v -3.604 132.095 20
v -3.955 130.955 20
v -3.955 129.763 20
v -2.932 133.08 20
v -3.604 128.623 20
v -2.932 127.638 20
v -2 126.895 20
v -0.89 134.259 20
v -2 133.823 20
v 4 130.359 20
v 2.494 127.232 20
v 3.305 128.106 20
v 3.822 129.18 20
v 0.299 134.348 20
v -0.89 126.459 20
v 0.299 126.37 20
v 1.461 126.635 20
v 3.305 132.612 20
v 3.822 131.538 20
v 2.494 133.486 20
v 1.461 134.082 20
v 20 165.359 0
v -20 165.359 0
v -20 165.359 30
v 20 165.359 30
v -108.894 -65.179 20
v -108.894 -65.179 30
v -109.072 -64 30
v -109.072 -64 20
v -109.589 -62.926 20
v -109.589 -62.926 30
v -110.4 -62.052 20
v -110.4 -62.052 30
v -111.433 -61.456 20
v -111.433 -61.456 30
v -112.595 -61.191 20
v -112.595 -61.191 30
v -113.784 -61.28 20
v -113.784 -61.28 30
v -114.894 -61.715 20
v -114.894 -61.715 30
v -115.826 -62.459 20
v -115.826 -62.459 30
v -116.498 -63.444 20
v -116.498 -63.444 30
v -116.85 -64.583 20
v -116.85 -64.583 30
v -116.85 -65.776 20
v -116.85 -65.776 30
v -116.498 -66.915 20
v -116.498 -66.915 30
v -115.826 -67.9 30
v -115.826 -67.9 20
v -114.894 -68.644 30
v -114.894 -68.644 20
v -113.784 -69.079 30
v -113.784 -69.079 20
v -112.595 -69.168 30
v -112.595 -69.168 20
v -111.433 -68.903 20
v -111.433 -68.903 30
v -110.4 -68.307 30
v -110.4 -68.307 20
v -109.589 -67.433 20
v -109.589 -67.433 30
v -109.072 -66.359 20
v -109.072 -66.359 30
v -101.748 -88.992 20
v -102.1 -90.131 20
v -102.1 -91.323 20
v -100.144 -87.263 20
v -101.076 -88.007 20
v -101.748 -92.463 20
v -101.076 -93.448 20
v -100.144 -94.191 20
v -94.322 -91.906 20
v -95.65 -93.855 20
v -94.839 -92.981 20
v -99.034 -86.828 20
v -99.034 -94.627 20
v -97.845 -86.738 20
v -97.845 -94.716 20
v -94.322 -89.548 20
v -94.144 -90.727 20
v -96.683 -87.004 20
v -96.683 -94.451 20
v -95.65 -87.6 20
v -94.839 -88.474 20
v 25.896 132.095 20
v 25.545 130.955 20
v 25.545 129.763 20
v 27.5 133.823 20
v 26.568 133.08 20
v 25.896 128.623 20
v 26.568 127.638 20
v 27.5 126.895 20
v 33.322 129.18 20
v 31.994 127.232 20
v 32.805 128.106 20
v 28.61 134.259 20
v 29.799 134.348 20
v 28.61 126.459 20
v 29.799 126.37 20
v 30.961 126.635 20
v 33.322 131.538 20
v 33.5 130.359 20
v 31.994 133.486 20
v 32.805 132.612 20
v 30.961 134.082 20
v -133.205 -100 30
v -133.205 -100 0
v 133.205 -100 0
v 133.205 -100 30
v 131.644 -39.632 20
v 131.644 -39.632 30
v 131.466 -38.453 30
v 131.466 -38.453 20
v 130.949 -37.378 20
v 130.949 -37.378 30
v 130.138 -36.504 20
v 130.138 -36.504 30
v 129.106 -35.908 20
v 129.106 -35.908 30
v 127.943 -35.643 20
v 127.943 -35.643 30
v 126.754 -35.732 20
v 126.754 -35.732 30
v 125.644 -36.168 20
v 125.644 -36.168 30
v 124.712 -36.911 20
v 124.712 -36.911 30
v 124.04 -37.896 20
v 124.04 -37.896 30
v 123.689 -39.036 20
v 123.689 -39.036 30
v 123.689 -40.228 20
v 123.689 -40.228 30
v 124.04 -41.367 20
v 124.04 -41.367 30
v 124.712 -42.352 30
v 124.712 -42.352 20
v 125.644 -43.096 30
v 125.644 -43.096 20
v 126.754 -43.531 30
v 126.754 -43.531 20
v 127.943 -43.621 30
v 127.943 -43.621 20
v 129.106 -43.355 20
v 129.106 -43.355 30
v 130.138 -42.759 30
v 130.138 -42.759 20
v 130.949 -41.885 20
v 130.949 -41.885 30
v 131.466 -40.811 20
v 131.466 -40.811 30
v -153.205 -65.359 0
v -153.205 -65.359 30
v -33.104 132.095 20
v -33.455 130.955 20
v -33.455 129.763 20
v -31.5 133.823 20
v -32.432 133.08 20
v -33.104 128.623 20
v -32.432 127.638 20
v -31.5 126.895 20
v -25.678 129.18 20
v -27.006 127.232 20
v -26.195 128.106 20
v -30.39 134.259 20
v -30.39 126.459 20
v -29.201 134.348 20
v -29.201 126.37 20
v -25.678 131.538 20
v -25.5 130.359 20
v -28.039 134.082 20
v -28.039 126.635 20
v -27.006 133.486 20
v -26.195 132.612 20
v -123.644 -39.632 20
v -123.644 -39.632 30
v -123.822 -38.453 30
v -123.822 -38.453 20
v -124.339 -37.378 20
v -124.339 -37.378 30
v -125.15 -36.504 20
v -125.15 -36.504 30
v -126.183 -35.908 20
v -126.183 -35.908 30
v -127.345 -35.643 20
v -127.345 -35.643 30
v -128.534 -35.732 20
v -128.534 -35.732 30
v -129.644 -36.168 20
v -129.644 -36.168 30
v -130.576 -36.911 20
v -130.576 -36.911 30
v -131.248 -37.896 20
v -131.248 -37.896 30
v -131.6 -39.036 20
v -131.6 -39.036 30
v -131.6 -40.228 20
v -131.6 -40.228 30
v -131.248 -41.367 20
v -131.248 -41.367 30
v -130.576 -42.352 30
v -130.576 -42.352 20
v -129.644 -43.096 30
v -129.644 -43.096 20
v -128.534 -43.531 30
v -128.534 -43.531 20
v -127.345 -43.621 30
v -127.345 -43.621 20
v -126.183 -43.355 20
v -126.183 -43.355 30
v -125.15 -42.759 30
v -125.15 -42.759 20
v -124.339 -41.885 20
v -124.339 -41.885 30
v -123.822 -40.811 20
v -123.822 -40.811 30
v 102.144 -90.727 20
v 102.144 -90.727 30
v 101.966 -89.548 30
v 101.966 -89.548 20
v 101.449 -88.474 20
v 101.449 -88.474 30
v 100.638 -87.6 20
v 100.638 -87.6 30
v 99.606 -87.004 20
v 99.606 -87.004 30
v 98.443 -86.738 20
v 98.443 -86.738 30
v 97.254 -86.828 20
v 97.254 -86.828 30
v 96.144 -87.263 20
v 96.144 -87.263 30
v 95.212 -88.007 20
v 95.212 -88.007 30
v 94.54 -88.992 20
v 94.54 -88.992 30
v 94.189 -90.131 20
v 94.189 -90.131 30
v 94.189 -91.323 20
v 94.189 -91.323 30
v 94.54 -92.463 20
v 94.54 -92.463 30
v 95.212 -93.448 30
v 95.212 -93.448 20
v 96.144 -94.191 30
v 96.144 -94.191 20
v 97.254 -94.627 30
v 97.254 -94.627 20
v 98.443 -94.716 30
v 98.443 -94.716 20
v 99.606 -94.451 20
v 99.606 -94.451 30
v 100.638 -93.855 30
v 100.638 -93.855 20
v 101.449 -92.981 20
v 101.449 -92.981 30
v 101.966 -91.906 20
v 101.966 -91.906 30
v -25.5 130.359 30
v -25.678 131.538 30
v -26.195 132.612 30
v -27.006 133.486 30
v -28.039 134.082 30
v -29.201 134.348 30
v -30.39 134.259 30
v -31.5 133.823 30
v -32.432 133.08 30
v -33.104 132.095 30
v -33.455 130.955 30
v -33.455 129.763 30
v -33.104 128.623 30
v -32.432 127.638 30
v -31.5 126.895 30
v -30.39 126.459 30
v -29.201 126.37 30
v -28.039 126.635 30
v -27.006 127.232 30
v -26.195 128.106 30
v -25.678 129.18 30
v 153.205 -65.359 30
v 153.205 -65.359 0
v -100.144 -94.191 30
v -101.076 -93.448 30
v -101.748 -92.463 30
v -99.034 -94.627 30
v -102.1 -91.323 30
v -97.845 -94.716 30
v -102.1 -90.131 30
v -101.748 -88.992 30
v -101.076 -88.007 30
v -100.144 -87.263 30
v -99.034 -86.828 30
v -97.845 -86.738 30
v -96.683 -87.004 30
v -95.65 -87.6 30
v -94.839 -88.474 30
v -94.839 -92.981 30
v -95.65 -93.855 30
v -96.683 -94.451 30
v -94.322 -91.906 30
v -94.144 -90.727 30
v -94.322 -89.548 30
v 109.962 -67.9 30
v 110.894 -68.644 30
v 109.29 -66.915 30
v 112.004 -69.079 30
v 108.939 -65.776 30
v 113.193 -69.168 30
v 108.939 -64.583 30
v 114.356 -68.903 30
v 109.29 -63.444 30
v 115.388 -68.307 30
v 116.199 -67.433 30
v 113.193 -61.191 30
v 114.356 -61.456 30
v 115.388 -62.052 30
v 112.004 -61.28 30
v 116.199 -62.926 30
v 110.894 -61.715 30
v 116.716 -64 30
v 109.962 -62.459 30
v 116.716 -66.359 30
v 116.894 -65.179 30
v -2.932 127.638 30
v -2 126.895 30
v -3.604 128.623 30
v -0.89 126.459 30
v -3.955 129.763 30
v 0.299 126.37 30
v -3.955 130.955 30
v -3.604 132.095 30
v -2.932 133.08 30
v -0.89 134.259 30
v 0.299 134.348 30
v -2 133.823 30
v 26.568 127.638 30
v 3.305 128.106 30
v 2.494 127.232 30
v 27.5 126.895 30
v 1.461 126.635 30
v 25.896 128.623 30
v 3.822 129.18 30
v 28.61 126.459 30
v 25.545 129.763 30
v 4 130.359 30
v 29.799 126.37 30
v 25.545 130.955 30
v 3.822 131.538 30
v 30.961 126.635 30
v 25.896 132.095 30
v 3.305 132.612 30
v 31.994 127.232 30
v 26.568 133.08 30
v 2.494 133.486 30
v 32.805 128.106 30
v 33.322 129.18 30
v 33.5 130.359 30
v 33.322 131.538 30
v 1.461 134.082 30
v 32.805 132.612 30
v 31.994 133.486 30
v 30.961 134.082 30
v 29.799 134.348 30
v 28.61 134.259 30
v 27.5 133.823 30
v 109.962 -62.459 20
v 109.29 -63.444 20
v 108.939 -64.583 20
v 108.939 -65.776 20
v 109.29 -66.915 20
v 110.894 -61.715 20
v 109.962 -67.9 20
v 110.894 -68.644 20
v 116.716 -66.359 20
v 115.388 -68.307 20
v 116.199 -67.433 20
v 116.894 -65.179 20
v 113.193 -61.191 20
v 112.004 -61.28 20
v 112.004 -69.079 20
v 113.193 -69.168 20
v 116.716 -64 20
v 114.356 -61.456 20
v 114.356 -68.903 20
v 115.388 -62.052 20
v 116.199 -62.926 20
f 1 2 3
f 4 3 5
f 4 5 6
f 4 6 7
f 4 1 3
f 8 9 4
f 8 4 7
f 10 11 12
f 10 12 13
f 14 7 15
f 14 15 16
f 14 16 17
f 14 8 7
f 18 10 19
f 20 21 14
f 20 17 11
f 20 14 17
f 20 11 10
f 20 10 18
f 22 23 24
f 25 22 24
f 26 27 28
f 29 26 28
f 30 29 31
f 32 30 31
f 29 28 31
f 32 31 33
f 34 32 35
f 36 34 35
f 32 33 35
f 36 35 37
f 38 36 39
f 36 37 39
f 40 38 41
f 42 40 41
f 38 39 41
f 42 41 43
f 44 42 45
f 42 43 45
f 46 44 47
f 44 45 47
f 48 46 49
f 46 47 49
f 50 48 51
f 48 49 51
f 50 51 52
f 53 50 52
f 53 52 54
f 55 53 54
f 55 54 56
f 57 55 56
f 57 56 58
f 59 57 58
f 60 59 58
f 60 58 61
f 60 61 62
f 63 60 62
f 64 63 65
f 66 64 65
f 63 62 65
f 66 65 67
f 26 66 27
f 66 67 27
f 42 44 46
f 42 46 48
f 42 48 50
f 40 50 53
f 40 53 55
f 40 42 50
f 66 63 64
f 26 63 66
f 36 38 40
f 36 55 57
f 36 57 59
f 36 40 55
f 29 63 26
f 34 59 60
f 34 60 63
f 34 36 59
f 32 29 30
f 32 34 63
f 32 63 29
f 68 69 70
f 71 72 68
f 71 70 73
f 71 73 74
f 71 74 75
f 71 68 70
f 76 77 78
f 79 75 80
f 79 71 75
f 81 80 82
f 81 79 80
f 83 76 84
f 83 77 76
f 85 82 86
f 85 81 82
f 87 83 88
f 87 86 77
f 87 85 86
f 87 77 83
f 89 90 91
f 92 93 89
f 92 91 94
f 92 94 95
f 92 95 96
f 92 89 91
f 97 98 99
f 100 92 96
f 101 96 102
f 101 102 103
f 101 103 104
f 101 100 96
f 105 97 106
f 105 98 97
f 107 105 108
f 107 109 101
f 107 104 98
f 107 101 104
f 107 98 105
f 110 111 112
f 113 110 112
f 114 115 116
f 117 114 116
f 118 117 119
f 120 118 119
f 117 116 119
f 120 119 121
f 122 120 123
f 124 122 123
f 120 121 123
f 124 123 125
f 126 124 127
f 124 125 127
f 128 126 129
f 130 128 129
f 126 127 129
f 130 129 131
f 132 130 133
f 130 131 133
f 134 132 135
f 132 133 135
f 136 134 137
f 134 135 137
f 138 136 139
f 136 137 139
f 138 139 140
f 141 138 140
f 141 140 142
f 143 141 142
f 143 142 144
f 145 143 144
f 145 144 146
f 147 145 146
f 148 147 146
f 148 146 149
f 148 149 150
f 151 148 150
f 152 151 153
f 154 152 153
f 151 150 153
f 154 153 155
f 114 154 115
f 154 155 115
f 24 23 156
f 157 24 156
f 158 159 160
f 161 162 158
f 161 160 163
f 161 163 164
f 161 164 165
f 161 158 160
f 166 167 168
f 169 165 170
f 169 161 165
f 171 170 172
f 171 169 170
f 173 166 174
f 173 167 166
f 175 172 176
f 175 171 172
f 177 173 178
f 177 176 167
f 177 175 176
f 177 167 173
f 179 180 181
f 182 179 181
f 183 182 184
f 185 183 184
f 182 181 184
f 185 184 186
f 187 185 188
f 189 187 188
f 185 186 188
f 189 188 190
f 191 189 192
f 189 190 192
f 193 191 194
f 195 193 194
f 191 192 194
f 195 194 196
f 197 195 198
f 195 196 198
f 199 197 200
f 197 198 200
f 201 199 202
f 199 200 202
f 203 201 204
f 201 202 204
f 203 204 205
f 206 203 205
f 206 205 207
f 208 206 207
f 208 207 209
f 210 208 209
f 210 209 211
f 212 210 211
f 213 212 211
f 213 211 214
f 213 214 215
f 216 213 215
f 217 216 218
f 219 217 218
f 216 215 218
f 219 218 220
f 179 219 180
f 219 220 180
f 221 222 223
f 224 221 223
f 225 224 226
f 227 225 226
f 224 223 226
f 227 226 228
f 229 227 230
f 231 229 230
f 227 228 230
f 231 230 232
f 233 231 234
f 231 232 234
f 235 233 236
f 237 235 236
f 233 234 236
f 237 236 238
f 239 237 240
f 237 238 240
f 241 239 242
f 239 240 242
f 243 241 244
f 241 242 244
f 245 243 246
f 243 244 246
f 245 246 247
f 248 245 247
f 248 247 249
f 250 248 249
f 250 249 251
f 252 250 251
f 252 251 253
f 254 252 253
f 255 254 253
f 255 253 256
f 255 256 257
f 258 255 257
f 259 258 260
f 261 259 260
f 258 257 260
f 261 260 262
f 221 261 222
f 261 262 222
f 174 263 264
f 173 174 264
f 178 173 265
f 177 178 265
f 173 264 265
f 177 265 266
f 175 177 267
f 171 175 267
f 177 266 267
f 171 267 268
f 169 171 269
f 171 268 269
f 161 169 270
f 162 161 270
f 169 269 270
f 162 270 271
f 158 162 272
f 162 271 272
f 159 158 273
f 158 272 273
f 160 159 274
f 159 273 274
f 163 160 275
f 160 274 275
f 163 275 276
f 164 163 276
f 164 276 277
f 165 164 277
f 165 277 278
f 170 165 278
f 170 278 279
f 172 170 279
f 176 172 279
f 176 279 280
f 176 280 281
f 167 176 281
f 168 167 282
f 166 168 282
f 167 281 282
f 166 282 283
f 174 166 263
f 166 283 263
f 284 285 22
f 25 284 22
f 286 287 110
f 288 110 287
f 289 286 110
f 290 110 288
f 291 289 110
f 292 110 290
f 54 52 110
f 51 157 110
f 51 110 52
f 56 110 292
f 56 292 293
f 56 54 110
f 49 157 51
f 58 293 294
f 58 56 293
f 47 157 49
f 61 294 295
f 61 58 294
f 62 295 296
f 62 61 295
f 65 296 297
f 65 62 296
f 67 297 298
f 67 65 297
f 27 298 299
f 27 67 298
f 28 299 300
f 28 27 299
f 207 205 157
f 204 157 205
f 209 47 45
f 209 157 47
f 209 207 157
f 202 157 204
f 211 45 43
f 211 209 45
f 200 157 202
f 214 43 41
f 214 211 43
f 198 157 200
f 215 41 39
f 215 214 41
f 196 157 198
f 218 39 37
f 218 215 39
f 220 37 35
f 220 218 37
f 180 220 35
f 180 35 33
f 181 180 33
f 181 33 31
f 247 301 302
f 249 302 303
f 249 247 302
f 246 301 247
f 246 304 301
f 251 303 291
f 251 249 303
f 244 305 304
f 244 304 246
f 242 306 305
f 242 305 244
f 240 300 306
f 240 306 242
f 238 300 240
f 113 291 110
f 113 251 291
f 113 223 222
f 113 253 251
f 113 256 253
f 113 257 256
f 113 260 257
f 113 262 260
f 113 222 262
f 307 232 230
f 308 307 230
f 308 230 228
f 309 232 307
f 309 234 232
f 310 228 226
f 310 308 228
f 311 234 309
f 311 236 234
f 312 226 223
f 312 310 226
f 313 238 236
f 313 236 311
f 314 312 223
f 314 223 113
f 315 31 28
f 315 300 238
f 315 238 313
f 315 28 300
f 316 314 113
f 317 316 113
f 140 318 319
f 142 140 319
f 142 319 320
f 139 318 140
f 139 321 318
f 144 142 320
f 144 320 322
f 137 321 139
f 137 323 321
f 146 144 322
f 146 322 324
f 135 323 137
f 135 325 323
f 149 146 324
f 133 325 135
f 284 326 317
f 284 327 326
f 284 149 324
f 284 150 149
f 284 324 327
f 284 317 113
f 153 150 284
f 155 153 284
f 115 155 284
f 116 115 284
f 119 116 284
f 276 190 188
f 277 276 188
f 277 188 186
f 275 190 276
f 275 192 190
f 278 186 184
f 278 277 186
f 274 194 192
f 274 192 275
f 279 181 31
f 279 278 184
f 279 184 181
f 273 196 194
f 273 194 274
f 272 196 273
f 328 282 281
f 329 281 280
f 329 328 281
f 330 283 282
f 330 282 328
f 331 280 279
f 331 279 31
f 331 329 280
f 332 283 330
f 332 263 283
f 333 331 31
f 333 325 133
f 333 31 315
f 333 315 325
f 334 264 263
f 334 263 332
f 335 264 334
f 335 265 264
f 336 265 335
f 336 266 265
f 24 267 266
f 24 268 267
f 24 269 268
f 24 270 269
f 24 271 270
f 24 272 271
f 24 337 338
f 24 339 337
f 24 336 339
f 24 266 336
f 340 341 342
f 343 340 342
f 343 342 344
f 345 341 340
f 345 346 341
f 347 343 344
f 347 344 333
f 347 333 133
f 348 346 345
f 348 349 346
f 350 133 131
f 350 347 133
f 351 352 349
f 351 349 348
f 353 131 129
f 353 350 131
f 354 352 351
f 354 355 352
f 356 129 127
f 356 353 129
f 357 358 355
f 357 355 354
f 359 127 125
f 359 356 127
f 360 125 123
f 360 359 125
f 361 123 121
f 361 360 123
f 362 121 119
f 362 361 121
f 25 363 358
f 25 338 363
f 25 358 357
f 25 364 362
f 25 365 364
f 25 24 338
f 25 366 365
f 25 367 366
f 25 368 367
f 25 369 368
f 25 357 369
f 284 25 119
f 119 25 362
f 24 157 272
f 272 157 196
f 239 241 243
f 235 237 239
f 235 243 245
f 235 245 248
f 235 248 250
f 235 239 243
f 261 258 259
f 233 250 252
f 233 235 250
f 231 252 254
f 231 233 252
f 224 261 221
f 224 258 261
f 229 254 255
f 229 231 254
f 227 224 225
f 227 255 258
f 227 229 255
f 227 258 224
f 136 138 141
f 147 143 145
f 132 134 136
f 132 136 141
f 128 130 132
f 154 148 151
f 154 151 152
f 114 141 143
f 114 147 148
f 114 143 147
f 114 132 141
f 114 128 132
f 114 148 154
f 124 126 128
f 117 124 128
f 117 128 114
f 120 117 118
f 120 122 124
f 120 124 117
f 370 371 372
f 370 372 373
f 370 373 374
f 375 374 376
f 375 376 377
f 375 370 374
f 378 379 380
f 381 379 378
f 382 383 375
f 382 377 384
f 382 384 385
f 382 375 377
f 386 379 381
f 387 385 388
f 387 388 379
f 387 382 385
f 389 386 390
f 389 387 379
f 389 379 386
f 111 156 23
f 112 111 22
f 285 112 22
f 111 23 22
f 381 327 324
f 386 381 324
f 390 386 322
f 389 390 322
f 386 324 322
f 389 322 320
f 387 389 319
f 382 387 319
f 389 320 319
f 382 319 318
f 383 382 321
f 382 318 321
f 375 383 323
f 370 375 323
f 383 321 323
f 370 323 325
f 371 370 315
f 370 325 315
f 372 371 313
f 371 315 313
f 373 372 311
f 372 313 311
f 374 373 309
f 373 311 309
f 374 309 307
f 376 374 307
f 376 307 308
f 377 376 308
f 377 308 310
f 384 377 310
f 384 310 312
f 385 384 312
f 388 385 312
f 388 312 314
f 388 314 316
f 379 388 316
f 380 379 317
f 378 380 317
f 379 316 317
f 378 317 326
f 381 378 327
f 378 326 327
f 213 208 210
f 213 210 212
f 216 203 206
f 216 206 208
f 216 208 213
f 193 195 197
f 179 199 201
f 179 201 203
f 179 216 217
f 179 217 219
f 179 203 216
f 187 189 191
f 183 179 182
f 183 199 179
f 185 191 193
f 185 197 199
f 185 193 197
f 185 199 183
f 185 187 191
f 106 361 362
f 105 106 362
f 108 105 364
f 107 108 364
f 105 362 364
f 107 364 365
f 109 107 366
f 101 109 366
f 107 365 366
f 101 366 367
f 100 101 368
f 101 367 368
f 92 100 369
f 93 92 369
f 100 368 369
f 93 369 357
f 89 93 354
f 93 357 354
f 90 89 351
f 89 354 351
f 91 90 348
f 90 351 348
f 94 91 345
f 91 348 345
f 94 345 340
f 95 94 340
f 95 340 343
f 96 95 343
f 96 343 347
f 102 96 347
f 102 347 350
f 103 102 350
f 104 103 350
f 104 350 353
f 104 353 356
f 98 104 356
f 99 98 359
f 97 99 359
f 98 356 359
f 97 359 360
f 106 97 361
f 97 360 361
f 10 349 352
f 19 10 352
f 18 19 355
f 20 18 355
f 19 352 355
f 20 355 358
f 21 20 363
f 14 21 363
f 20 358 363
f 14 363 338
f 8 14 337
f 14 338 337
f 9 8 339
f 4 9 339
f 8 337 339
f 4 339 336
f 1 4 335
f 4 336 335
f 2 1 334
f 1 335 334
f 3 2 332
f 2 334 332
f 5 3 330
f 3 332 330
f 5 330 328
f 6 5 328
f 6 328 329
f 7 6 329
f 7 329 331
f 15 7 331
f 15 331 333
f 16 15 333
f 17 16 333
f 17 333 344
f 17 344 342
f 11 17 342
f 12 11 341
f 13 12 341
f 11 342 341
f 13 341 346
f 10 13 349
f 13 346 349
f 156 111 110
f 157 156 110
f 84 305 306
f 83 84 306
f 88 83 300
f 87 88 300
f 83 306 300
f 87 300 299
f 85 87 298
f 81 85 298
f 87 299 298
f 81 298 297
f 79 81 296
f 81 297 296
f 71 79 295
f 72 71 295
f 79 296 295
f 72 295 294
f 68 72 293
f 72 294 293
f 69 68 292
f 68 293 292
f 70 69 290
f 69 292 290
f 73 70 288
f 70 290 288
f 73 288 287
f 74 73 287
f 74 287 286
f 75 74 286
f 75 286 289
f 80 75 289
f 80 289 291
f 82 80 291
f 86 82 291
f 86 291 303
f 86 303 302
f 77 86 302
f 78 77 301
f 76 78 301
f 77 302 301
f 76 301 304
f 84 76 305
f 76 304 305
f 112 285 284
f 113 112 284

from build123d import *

# Parameters (mm, degrees)
F1_DEPTH = 30
F2_SIZE  = 40
F3_R     = 4
F4_DEPTH = 10


with BuildPart() as f1:
    # F0 (on Top) → F1 (new body)
    with BuildSketch(Plane.XY):
        Polygon((-173.205081, -100), (173.205081, -100), (0, 200), align=None)
    extrude(amount=F1_DEPTH)

    # F2
    f2_edges = [f1.edges().sort_by_distance(p)[0] for p in [
        (-173.205081, -100, 15),
        (173.205081, -100, 15),
        (0, 200, 15),
    ]]
    chamfer(f2_edges, length=F2_SIZE)

    # F3 (on face) → F4 (cut)
    with BuildSketch(Plane.XY.offset(30)):
        with Locations((-29.5, 130.358984)):
            Circle(F3_R)
        with Locations((29.5, 130.358984)):
            Circle(F3_R)
        with Locations((-98.144192, -90.727241)):
            Circle(F3_R)
        with Locations((-127.644192, -39.631743)):
            Circle(F3_R)
        with Locations((127.644192, -39.631743)):
            Circle(F3_R)
        with Locations((98.144192, -90.727241)):
            Circle(F3_R)
        with Locations((0, 130.358984)):
            Circle(F3_R)
        with Locations((-112.894192, -65.179492)):
            Circle(F3_R)
        with Locations((112.894192, -65.179492)):
            Circle(F3_R)
    extrude(amount=-F4_DEPTH, mode=Mode.SUBTRACT)


solid = f1.part
